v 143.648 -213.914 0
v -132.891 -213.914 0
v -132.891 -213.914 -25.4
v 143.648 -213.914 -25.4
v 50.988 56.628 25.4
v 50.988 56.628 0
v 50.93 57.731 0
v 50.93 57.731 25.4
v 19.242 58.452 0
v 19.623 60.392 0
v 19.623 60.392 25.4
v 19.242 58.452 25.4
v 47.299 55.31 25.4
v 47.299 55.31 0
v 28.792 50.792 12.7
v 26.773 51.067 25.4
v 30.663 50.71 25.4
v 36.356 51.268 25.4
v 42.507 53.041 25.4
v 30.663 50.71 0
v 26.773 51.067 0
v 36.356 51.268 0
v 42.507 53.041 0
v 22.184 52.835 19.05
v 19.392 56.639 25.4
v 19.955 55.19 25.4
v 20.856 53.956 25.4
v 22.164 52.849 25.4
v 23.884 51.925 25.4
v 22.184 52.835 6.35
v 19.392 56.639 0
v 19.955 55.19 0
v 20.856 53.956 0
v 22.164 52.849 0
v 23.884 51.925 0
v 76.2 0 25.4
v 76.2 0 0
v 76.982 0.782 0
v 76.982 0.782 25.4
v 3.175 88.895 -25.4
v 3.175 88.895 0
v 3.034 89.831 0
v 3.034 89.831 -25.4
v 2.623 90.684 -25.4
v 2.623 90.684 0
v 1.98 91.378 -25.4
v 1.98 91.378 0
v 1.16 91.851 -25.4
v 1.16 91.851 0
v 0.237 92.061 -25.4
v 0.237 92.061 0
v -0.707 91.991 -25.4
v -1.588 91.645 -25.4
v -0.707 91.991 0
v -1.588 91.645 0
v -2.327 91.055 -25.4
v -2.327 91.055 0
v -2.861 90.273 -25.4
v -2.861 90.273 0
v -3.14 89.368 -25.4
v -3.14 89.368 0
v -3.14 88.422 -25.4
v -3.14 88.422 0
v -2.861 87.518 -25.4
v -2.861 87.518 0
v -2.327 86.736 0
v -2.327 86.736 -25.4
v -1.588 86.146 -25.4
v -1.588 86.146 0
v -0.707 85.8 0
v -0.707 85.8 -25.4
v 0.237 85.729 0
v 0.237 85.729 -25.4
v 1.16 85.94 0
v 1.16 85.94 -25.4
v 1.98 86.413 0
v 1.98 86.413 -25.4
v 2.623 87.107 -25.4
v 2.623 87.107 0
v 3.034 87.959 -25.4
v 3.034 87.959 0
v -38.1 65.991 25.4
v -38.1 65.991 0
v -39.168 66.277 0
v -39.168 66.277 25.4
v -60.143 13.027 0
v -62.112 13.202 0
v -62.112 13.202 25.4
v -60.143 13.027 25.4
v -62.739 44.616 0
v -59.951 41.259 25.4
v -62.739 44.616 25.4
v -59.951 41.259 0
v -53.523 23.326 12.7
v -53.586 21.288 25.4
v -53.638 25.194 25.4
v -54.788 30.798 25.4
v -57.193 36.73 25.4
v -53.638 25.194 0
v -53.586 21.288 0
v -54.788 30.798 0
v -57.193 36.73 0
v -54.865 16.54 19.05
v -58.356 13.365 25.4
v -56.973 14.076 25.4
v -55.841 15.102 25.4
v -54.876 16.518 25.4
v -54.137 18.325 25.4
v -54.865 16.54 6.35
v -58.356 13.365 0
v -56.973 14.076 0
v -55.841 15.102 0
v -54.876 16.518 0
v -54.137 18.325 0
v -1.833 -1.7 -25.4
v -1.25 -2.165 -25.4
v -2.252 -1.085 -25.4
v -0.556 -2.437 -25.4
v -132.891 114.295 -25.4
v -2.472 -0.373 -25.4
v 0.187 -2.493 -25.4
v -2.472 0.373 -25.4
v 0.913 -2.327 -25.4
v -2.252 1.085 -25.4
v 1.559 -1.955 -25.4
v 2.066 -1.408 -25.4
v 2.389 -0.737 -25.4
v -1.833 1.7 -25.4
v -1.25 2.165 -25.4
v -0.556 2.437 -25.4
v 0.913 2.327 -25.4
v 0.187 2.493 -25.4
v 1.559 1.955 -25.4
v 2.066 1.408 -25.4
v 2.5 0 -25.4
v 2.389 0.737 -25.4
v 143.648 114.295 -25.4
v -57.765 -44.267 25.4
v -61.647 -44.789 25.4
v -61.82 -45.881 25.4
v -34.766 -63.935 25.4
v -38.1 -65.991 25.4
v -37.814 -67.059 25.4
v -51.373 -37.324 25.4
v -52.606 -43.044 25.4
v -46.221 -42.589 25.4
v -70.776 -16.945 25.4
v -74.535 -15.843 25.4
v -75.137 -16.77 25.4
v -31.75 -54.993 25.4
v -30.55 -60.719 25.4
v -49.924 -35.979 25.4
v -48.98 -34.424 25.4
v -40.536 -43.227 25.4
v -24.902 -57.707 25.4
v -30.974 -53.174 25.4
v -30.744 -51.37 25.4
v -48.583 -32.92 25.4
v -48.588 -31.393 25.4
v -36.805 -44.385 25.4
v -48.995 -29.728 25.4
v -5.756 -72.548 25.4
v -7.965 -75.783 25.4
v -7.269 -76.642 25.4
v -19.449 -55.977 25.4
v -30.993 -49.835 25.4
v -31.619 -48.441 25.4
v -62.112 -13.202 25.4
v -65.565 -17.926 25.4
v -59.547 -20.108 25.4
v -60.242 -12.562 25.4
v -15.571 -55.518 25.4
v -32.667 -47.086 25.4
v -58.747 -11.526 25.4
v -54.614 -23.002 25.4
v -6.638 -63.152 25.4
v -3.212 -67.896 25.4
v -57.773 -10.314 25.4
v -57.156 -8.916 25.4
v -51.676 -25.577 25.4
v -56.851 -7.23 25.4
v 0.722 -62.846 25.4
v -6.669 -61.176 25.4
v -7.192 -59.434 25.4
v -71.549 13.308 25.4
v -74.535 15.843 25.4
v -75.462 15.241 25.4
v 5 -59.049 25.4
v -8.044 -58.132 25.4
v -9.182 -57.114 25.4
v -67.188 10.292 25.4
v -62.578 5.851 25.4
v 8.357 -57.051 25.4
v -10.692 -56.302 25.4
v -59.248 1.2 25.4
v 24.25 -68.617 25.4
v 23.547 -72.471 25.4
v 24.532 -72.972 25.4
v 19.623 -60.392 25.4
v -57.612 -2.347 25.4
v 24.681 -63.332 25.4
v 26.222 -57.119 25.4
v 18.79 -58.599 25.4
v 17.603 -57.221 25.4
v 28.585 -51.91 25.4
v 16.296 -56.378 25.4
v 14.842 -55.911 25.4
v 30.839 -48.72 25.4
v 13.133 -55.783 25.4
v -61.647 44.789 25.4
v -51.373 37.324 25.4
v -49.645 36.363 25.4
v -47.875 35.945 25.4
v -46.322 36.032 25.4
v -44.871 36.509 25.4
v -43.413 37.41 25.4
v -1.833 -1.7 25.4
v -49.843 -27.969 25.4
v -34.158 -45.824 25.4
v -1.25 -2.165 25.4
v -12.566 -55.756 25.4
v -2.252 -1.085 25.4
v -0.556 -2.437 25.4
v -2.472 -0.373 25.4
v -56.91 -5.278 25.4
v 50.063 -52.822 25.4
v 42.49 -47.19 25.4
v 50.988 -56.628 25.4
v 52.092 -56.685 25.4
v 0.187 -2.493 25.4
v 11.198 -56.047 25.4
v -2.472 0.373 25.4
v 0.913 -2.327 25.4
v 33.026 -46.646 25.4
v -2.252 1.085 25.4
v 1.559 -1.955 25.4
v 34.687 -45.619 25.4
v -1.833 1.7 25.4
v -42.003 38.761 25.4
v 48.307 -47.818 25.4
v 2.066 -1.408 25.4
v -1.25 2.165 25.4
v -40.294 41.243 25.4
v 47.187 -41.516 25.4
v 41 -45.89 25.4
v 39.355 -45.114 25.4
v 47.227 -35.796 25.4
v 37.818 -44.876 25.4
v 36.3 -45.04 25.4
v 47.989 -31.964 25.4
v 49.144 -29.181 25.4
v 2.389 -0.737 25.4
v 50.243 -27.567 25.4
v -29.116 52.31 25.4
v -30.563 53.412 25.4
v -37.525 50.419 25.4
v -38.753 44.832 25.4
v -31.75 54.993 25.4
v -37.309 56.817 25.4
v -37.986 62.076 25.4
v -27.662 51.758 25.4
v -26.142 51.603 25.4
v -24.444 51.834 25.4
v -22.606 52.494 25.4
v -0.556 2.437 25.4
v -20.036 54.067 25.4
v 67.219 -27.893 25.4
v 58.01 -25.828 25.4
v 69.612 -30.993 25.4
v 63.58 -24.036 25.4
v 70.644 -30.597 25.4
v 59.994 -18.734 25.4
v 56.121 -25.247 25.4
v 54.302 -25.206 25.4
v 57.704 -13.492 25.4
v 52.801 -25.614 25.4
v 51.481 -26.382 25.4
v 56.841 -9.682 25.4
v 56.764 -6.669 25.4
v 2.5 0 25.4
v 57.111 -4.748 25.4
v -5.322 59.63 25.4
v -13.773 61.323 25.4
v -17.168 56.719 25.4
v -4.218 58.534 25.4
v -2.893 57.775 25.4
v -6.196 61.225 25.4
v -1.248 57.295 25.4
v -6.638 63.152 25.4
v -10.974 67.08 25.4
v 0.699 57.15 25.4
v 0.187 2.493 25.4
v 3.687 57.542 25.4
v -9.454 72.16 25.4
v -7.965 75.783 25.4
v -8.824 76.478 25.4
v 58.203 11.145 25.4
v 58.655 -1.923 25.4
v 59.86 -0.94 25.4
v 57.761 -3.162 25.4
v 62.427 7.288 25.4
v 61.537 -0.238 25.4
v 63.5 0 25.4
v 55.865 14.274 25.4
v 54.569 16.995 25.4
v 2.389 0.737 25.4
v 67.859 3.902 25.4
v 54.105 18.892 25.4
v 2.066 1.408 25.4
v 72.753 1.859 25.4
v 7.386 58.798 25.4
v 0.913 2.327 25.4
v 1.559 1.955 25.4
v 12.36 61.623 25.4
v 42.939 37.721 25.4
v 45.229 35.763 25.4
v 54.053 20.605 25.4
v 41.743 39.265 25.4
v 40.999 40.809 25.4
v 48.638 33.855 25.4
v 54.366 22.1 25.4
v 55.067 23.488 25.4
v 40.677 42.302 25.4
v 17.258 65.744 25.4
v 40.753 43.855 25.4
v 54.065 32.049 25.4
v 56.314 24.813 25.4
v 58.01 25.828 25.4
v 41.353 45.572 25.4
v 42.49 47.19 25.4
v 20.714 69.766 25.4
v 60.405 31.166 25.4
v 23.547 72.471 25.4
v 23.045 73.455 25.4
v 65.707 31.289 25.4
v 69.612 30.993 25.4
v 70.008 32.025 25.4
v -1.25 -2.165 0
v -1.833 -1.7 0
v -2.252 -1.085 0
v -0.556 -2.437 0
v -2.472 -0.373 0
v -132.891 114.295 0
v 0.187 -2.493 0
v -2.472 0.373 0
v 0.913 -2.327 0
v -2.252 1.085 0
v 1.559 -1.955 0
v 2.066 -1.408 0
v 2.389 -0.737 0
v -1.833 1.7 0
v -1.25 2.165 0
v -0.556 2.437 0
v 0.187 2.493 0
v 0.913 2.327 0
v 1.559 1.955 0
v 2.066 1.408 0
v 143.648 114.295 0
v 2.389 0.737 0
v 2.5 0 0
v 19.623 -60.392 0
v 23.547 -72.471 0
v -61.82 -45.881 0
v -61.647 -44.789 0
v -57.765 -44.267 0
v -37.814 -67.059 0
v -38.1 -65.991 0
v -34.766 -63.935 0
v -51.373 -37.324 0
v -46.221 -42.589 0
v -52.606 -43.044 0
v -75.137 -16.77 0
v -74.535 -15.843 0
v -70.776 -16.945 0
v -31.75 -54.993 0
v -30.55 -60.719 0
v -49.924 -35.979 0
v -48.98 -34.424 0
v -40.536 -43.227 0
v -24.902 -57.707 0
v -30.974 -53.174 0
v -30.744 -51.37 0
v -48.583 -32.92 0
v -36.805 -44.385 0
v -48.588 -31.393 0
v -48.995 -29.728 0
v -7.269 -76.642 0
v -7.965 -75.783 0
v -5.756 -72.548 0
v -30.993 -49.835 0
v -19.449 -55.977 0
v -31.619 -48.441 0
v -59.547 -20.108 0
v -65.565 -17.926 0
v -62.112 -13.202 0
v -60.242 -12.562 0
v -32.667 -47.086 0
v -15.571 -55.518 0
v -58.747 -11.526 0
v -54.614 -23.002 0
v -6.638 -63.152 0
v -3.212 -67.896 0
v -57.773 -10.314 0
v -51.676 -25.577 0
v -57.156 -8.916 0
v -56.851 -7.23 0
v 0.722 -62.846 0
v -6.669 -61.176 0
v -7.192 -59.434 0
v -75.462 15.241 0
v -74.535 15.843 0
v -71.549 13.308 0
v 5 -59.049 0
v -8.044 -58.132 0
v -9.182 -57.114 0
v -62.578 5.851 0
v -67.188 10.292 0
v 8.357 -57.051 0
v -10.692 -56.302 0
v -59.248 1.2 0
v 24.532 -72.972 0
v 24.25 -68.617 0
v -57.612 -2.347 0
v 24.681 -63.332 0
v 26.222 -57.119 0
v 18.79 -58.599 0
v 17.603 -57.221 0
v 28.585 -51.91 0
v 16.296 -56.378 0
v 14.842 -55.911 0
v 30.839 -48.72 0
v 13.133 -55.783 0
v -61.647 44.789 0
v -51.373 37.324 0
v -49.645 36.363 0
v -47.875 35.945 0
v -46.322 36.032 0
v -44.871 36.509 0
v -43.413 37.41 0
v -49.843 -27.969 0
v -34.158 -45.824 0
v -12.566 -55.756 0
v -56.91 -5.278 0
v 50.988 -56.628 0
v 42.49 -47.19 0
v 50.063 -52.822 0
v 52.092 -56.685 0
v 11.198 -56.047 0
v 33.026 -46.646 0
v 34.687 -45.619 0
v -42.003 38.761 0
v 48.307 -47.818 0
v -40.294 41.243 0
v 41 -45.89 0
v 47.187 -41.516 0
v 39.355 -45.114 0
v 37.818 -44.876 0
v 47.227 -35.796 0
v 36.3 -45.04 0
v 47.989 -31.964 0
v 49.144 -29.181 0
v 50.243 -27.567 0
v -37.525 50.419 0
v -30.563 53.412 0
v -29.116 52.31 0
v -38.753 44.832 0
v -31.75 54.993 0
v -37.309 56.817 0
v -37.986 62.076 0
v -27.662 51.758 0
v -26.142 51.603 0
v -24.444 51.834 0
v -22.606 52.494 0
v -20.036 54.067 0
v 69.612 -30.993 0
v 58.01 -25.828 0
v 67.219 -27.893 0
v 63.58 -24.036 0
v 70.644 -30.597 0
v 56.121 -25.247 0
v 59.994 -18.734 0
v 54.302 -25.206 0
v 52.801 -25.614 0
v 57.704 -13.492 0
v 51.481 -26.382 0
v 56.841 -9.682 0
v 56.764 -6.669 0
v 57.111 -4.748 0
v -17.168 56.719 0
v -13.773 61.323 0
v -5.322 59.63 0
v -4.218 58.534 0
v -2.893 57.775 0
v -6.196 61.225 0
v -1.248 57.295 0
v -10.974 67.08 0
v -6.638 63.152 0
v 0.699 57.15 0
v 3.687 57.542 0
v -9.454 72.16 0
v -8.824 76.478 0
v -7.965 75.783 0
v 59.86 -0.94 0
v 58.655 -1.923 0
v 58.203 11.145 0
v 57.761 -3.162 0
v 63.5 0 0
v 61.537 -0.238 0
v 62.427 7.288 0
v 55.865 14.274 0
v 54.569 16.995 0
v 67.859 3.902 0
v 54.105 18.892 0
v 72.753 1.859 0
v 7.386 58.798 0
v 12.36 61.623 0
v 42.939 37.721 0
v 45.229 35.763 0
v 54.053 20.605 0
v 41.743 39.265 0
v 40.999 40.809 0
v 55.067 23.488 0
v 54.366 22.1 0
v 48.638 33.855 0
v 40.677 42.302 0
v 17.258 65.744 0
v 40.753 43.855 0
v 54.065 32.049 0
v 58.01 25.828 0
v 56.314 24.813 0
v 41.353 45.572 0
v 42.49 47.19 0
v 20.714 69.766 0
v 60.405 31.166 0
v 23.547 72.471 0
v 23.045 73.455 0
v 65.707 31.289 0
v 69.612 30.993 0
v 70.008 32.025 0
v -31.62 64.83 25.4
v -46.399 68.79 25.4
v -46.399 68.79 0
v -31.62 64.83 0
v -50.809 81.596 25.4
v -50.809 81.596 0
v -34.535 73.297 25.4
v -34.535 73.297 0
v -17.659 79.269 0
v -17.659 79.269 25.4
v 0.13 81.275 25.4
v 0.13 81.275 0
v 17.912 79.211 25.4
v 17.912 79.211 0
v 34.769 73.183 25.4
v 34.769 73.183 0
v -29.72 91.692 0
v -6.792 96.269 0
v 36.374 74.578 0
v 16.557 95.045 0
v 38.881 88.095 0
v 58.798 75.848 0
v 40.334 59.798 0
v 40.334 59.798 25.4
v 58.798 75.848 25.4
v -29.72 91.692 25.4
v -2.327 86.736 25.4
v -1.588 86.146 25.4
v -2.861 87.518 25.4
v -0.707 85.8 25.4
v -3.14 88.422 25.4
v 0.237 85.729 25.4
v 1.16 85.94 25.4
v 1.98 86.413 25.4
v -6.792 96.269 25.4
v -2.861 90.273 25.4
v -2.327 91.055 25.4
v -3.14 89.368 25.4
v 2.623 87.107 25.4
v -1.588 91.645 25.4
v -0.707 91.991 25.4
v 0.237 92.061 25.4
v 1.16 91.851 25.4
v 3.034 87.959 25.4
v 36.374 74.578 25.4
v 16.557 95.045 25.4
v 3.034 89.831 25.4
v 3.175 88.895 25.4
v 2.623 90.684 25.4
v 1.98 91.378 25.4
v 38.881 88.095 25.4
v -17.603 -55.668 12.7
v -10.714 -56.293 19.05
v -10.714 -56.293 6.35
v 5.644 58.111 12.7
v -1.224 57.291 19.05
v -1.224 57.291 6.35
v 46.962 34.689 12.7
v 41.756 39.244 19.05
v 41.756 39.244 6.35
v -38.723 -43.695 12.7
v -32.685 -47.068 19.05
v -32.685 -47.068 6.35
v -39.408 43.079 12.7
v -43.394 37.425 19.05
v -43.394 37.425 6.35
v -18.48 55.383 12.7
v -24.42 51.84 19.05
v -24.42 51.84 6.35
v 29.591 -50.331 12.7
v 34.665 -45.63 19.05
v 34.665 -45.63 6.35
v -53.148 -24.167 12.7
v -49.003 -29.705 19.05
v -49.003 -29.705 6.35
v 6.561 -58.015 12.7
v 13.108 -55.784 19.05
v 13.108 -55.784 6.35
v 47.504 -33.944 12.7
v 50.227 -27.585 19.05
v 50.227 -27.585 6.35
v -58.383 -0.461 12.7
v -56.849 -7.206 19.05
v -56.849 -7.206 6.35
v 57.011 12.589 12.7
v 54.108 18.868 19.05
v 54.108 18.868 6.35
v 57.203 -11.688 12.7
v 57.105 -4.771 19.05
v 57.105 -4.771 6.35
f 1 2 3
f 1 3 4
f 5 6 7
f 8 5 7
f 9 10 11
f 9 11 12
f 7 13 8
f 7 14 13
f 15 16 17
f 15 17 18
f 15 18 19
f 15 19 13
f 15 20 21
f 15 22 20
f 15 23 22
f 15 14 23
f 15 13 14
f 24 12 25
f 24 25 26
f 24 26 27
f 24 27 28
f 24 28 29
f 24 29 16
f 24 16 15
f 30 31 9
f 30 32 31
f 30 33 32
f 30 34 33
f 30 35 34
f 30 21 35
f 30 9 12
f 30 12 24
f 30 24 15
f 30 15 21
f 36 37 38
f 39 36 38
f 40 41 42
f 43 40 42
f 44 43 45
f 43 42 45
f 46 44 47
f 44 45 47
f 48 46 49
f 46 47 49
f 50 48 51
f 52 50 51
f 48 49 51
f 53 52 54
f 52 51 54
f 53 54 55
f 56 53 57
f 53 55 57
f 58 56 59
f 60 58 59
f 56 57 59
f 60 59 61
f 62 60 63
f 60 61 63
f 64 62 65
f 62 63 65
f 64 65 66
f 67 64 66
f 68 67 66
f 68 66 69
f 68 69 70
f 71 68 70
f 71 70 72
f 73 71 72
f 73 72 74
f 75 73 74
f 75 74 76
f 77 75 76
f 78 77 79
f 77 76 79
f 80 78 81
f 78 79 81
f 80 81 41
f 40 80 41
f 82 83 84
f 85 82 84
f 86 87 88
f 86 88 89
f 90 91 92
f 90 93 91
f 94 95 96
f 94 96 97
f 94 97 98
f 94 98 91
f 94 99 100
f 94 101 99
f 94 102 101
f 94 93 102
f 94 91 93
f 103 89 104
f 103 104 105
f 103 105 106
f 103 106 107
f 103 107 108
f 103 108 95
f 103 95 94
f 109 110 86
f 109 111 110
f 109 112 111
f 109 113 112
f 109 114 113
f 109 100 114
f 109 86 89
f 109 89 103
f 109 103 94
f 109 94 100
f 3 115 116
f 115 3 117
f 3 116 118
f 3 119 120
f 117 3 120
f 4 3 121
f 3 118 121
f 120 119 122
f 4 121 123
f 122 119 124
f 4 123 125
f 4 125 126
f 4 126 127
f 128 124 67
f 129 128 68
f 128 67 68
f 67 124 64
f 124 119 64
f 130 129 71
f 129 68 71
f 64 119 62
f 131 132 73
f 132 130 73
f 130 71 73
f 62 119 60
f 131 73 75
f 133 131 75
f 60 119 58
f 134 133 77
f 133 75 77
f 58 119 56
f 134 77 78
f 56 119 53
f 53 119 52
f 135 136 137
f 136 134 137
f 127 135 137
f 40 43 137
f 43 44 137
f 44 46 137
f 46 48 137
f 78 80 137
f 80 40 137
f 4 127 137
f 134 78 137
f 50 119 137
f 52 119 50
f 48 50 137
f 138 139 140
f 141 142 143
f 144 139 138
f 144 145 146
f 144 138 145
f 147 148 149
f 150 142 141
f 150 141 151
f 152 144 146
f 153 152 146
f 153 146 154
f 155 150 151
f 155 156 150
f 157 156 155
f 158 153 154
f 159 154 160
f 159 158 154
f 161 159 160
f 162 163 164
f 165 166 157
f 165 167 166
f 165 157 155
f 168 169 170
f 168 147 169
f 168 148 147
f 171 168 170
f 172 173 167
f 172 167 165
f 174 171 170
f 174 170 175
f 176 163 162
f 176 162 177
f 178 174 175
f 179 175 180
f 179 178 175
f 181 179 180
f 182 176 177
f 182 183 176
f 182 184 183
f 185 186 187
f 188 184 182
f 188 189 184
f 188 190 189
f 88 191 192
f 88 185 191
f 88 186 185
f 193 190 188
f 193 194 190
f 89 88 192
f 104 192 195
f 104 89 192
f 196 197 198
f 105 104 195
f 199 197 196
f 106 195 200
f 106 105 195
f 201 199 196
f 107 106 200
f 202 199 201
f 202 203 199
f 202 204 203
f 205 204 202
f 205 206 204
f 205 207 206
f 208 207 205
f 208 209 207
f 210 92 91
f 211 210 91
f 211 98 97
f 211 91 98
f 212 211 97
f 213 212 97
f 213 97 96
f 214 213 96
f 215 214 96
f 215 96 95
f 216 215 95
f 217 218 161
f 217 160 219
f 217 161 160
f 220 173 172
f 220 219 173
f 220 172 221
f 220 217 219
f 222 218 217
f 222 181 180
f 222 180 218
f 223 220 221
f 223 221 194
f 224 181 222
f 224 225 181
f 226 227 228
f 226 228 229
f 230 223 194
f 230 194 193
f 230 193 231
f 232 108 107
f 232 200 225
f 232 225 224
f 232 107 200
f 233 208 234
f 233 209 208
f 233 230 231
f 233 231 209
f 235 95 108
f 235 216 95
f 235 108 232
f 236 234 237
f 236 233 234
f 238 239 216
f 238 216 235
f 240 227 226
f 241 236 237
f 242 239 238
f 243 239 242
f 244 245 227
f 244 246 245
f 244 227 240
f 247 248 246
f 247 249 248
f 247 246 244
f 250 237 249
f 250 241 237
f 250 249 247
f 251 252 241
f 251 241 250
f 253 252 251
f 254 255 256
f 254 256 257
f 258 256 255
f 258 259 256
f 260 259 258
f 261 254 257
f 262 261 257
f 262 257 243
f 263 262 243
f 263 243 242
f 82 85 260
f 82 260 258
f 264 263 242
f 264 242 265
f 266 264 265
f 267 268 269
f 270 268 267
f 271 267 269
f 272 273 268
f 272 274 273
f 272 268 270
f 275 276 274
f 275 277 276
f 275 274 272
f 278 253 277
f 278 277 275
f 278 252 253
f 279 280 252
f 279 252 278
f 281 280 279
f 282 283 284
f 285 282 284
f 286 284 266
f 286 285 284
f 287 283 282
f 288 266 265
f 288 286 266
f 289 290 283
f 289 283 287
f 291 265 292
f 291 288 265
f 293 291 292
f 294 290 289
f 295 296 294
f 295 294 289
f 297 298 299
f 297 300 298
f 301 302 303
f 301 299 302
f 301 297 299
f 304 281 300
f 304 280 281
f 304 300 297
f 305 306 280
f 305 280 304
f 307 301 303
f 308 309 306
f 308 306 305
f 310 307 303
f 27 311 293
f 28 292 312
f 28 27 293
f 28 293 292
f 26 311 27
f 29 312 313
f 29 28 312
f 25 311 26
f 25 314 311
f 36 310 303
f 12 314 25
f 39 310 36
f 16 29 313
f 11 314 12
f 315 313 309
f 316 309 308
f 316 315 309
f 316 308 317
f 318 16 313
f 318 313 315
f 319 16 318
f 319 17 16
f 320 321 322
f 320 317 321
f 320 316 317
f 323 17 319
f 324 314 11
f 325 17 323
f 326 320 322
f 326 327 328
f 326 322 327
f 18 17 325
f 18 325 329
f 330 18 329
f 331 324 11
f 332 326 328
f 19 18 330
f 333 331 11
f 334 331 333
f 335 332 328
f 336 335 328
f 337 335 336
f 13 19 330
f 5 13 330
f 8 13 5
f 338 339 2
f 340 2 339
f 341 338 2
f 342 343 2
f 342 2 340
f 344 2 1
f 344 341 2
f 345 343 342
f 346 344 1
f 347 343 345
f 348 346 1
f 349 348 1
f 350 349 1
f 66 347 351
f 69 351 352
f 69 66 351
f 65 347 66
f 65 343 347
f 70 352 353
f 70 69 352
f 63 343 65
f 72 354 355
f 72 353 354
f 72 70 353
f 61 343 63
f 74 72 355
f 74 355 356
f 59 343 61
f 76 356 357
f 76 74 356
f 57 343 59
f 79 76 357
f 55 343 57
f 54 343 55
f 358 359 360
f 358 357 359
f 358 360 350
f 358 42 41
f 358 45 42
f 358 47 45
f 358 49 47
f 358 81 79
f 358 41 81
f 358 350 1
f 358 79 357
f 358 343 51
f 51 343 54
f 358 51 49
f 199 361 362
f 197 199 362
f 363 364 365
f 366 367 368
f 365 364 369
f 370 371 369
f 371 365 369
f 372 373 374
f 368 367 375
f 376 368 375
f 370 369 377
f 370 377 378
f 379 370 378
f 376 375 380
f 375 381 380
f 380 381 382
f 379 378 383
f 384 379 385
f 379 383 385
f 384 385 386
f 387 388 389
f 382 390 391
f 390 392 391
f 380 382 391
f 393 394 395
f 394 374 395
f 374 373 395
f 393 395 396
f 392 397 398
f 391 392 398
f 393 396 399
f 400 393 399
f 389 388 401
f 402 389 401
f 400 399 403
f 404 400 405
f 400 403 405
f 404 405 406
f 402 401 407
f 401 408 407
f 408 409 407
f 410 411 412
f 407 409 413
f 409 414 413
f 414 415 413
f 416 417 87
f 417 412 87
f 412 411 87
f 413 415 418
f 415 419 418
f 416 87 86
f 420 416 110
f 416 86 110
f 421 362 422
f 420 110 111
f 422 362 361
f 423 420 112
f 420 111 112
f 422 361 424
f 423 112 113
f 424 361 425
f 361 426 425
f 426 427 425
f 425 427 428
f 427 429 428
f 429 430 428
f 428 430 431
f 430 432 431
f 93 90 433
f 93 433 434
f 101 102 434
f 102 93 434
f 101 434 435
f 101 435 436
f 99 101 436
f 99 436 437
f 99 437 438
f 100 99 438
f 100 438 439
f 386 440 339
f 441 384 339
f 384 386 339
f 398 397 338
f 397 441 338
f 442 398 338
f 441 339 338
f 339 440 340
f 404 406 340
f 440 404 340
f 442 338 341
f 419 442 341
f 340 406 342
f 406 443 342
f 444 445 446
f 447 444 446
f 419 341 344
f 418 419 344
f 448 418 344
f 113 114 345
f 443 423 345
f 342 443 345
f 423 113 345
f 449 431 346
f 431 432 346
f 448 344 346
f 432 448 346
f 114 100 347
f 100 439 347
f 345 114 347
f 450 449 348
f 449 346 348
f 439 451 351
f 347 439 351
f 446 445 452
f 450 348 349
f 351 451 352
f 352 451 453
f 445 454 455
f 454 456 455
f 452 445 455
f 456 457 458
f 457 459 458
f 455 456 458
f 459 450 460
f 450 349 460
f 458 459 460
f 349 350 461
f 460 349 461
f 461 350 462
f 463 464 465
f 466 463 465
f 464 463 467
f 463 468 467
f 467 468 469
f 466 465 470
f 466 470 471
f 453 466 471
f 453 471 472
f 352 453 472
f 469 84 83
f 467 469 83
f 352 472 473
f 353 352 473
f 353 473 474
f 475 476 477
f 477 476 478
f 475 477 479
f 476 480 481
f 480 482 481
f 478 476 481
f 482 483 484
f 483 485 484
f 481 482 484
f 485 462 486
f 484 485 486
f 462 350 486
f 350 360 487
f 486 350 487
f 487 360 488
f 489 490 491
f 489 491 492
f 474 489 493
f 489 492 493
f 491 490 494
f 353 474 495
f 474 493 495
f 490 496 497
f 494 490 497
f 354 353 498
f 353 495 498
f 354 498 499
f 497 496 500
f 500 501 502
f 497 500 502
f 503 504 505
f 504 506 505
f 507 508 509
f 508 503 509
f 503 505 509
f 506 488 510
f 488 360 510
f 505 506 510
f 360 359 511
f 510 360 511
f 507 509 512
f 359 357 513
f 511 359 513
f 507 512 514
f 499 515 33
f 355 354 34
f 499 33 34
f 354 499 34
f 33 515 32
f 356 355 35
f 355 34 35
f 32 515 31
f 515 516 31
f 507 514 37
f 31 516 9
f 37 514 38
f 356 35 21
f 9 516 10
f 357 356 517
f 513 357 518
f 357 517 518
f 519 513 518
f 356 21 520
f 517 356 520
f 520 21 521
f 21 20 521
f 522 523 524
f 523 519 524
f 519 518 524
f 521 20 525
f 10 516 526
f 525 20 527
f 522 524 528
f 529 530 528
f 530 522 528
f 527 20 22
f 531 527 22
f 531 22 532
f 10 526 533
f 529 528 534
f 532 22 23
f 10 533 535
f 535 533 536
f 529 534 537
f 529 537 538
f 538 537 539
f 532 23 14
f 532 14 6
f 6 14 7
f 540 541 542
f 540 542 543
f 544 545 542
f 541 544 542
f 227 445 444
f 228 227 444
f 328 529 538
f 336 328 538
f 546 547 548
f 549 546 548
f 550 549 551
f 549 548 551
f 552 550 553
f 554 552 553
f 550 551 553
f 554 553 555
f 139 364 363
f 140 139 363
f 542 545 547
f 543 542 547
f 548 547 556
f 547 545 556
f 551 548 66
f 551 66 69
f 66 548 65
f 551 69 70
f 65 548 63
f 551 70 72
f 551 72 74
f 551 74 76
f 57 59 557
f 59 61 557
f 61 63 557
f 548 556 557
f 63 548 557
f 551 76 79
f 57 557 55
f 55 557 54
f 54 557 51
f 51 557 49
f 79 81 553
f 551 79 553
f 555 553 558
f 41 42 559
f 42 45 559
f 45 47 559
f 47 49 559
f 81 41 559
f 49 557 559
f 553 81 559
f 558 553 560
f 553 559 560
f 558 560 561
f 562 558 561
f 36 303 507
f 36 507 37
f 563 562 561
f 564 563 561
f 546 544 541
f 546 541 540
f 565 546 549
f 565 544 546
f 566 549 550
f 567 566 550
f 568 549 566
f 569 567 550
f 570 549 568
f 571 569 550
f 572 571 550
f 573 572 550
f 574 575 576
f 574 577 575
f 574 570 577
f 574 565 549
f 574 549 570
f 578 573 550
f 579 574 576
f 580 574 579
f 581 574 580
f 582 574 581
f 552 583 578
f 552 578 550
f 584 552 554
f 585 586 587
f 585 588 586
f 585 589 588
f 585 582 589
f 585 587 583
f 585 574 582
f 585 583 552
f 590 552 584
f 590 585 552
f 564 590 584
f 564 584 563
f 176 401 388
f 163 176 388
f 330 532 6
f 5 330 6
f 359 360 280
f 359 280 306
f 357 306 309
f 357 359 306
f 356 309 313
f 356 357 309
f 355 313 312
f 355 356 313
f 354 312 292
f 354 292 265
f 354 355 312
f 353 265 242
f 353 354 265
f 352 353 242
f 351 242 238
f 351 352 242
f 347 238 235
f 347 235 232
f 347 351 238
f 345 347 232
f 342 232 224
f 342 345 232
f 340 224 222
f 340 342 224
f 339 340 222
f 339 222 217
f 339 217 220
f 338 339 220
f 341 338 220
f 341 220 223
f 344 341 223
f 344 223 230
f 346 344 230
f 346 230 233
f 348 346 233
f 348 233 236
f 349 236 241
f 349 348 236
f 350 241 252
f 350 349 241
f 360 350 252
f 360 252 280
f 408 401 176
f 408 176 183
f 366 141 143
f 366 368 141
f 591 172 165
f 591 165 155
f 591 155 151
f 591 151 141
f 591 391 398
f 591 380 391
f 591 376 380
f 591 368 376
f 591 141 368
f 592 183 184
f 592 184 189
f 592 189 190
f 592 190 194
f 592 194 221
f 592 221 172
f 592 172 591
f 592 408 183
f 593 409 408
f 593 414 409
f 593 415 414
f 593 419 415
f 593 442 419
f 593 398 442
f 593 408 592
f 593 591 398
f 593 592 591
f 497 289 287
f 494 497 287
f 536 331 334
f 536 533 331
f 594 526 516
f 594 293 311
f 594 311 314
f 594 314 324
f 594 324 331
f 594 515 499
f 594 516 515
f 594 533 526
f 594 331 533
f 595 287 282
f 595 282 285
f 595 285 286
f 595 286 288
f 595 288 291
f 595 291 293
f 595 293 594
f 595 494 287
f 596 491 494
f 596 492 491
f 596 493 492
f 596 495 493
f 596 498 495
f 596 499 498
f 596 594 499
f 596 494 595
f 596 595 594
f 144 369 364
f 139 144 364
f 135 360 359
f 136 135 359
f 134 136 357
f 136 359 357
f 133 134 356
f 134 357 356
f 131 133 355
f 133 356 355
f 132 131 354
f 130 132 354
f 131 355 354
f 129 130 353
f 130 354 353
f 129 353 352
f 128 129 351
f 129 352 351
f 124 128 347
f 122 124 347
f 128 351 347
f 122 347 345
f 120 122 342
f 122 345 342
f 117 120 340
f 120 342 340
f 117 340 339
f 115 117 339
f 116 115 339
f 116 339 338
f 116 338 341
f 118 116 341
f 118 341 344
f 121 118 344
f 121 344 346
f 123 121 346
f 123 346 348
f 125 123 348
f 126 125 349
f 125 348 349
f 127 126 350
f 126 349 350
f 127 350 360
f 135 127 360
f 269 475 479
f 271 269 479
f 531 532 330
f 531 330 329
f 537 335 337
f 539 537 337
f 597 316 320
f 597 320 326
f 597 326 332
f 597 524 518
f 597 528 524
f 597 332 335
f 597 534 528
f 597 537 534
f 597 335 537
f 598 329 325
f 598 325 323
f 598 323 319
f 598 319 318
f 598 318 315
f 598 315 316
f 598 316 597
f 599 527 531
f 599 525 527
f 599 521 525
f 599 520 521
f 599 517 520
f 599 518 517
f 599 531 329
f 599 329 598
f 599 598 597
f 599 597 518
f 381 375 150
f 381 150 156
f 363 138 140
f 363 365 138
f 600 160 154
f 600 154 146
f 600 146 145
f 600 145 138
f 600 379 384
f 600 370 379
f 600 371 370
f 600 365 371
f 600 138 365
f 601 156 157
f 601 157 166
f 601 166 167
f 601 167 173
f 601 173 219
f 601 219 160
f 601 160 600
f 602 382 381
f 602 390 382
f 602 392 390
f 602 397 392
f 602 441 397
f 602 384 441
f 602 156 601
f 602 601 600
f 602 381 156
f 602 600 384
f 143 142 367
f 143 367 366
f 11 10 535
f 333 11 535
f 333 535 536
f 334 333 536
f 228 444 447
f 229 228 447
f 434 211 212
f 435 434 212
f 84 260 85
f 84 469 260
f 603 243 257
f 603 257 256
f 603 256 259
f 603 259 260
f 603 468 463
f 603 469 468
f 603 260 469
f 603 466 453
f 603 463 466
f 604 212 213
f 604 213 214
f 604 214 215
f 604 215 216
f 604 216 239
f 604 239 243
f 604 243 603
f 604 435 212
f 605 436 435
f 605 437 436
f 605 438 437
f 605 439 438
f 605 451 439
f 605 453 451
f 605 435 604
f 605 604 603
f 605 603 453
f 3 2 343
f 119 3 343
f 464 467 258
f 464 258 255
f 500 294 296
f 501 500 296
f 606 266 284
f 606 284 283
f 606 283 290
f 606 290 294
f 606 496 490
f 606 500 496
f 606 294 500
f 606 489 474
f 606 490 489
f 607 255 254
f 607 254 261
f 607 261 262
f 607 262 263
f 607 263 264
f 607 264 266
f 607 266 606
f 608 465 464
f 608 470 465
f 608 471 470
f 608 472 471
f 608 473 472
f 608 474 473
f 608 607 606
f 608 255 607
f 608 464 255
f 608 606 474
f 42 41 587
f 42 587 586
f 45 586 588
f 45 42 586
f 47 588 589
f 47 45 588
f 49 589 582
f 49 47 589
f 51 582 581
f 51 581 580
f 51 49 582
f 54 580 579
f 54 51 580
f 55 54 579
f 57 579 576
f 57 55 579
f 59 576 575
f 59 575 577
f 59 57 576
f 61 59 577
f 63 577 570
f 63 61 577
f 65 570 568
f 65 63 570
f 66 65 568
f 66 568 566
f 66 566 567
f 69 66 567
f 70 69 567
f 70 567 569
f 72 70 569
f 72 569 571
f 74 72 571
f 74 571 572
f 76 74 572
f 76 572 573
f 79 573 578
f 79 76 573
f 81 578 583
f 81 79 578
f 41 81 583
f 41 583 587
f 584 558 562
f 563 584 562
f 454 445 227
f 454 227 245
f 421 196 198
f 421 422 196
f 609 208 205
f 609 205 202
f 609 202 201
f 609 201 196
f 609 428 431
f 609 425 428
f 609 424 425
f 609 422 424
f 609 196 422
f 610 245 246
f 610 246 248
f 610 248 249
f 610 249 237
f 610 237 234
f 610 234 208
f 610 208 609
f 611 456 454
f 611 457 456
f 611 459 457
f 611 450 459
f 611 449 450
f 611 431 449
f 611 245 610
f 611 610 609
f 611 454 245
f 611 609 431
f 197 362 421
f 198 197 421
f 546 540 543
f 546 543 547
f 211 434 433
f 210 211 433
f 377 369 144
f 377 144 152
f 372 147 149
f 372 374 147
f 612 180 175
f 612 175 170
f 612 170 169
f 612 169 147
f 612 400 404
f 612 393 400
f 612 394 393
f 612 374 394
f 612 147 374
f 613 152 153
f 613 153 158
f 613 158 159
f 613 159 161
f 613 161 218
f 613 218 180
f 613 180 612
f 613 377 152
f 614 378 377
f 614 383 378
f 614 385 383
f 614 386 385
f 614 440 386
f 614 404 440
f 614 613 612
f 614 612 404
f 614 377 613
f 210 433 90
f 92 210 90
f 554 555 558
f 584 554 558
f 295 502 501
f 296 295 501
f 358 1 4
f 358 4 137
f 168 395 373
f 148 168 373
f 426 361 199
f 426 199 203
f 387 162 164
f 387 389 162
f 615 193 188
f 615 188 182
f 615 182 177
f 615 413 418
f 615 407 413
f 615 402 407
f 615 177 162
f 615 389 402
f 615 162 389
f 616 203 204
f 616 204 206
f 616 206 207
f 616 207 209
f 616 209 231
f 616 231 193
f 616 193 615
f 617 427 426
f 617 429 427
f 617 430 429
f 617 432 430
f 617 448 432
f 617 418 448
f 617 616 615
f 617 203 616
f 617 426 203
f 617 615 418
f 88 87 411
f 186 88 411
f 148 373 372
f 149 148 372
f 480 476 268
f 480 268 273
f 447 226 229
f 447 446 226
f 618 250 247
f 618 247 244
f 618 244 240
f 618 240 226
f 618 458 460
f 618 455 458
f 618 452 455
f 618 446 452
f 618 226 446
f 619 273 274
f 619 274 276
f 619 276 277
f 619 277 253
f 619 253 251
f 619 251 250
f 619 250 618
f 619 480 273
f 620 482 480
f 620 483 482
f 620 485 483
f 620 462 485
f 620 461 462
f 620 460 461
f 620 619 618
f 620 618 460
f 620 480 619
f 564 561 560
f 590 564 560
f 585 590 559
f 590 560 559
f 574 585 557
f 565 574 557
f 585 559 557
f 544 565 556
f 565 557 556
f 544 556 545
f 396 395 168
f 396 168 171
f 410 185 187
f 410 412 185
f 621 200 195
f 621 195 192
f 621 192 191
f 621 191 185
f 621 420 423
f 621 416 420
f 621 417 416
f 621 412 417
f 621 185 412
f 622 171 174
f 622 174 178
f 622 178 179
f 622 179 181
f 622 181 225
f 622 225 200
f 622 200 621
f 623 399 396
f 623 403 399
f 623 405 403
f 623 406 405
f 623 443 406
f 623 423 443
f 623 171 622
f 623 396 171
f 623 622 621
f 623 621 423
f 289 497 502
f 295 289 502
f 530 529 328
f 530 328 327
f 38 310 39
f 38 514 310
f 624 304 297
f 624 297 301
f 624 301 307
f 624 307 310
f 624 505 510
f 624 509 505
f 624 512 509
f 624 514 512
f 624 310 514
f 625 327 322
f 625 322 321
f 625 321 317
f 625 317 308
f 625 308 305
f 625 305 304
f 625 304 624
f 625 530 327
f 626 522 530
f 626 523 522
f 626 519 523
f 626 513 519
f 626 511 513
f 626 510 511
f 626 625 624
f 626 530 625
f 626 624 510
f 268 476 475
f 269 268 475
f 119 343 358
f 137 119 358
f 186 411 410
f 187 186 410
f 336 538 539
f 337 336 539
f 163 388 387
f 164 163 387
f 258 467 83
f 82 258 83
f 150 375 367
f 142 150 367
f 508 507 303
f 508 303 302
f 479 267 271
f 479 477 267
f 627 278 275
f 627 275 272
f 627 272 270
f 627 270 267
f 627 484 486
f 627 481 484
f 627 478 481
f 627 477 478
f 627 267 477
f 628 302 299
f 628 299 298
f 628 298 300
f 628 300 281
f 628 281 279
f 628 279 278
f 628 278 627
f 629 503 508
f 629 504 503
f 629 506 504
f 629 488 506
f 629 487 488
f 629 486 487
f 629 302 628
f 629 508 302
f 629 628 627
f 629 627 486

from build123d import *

# Parameters (mm, degrees)
F0_R     = 2.5
F1_DEPTH = 25.4
F2_R     = 3.175
F3_DEPTH = 25.4
F4_W     = 276.5388935804
F4_H     = 328.2092958689
F4_R     = 2.5
F4_R_2   = 3.175
F5_DEPTH = 25.4


with BuildPart() as f1:
    # F0 (on Top) → F1 (new body)
    with BuildSketch(Plane.XY):
        with BuildLine():
            Line((-31.75, 54.9926131403), (-38.1, 65.9911357684))
            Line((-38.1, 65.9911357684), (-39.1676334379, 66.2772072859))
            add(Edge.make_bspline(
                [(-51.3725791428, 37.3243635206), (-20.4343957802, 14.8464575684), (-39.1676334379, 66.2772072859)],
                knots=[5.8868413258, 5.8868413258, 5.8868413258, 8.4002814063, 8.4002814063, 8.4002814063], degree=2, weights=[1, 0.3089380758, 1]))
            Line((-51.3725791428, 37.3243635206), (-61.6470949714, 44.7892362247))
            Line((-61.6470949714, 44.7892362247), (-62.7387824177, 44.6163299195))
            add(Edge.make_bspline(
                [(-62.1123726466, 13.2023923669), (-24.7063477576, 5.2514963308), (-62.7387824177, 44.6163299195)],
                knots=[5.8868413258, 5.8868413258, 5.8868413258, 8.4002814063, 8.4002814063, 8.4002814063], degree=2, weights=[1, 0.3089380758, 1]))
            Line((-62.1123726466, 13.2023923669), (-74.5348471759, 15.8428708403))
            Line((-74.5348471759, 15.8428708403), (-75.4618259535, 15.2408837834))
            add(Edge.make_bspline(
                [(-62.1123726466, -13.2023923669), (-24.7063477576, -5.2514963308), (-75.4618259535, 15.2408837834)],
                knots=[5.8868413258, 5.8868413258, 5.8868413258, 8.4002814063, 8.4002814063, 8.4002814063], degree=2, weights=[1, 0.3089380758, 1]))
            Line((-62.1123726466, -13.2023923669), (-74.5348471759, -15.8428708403))
            Line((-74.5348471759, -15.8428708403), (-75.1368342328, -16.7698496179))
            add(Edge.make_bspline(
                [(-51.3725791428, -37.3243635206), (-20.4343957802, -14.8464575684), (-75.1368342328, -16.7698496179)],
                knots=[5.8868413258, 5.8868413258, 5.8868413258, 8.4002814063, 8.4002814063, 8.4002814063], degree=2, weights=[1, 0.3089380758, 1]))
            Line((-51.3725791428, -37.3243635206), (-61.6470949714, -44.7892362247))
            Line((-61.6470949714, -44.7892362247), (-61.8200012766, -45.880923671))
            add(Edge.make_bspline(
                [(-31.75, -54.9926131403), (-12.6291511317, -21.8743314166), (-61.8200012766, -45.880923671)],
                knots=[5.8868413258, 5.8868413258, 5.8868413258, 8.4002814063, 8.4002814063, 8.4002814063], degree=2, weights=[1, 0.3089380758, 1]))
            Line((-31.75, -54.9926131403), (-38.1, -65.9911357684))
            Line((-38.1, -65.9911357684), (-37.8139284825, -67.0587692063))
            add(Edge.make_bspline(
                [(-6.6375574175, -63.1521403559), (-2.6402115203, -25.1199346408), (-37.8139284825, -67.0587692063)],
                knots=[5.8868413258, 5.8868413258, 5.8868413258, 8.4002814063, 8.4002814063, 8.4002814063], degree=2, weights=[1, 0.3089380758, 1]))
            Line((-6.6375574175, -63.1521403559), (-7.965068901, -75.7825684271))
            Line((-7.965068901, -75.7825684271), (-7.269483925, -76.641544336))
            add(Edge.make_bspline(
                [(19.6225791428, -60.3920887847), (7.8052446485, -24.0220729582), (-7.269483925, -76.641544336)],
                knots=[5.8868413258, 5.8868413258, 5.8868413258, 8.4002814063, 8.4002814063, 8.4002814063], degree=2, weights=[1, 0.3089380758, 1]))
            Line((19.6225791428, -60.3920887847), (23.5470949714, -72.4705065417))
            Line((23.5470949714, -72.4705065417), (24.5319204442, -72.9723001834))
            add(Edge.make_bspline(
                [(42.4897935038, -47.1896964178), (16.9011031091, -18.7705766274), (24.5319204442, -72.9723001834)],
                knots=[5.8868413258, 5.8868413258, 5.8868413258, 8.4002814063, 8.4002814063, 8.4002814063], degree=2, weights=[1, 0.3089380758, 1]))
            Line((42.4897935038, -47.1896964178), (50.9877522045, -56.6276357014))
            Line((50.9877522045, -56.6276357014), (52.0915329032, -56.6854823966))
            add(Edge.make_bspline(
                [(58.0101365603, -25.8277768353), (23.0746073005, -10.2734770724), (52.0915329032, -56.6854823966)],
                knots=[5.8868413258, 5.8868413258, 5.8868413258, 8.4002814063, 8.4002814063, 8.4002814063], degree=2, weights=[1, 0.3089380758, 1]))
            Line((58.0101365603, -25.8277768353), (69.6121638724, -30.9933322024))
            Line((69.6121638724, -30.9933322024), (70.6440460865, -30.597229732))
            add(Edge.make_bspline(
                [(63.5, 0), (25.2583022634, 0), (70.6440460865, -30.597229732)],
                knots=[5.8868413258, 5.8868413258, 5.8868413258, 8.4002814063, 8.4002814063, 8.4002814063], degree=2, weights=[1, 0.3089380758, 1]))
            Line((63.5, 0), (76.2, 0))
            Line((76.2, 0), (76.9815619204, 0.7815619204))
            add(Edge.make_bspline(
                [(58.0101365603, 25.8277768353), (23.0746073005, 10.2734770724), (76.9815619204, 0.7815619204)],
                knots=[5.8868413258, 5.8868413258, 5.8868413258, 8.4002814063, 8.4002814063, 8.4002814063], degree=2, weights=[1, 0.3089380758, 1]))
            Line((58.0101365603, 25.8277768353), (69.6121638724, 30.9933322024))
            Line((69.6121638724, 30.9933322024), (70.0082663428, 32.0252144165))
            add(Edge.make_bspline(
                [(42.4897935038, 47.1896964178), (16.9011031091, 18.7705766274), (70.0082663428, 32.0252144165)],
                knots=[5.8868413258, 5.8868413258, 5.8868413258, 8.4002814063, 8.4002814063, 8.4002814063], degree=2, weights=[1, 0.3089380758, 1]))
            Line((42.4897935038, 47.1896964178), (50.9877522045, 56.6276357014))
            Line((50.9877522045, 56.6276357014), (50.9299055093, 57.7314164))
            add(Edge.make_bspline(
                [(19.6225791428, 60.3920887847), (7.8052446485, 24.0220729582), (50.9299055093, 57.7314164)],
                knots=[5.8868413258, 5.8868413258, 5.8868413258, 8.4002814063, 8.4002814063, 8.4002814063], degree=2, weights=[1, 0.3089380758, 1]))
            Line((19.6225791428, 60.3920887847), (23.5470949714, 72.4705065417))
            Line((23.5470949714, 72.4705065417), (23.0453013296, 73.4553320146))
            add(Edge.make_bspline(
                [(-6.6375574175, 63.1521403559), (-2.6402115203, 25.1199346408), (23.0453013296, 73.4553320146)],
                knots=[5.8868413258, 5.8868413258, 5.8868413258, 8.4002814063, 8.4002814063, 8.4002814063], degree=2, weights=[1, 0.3089380758, 1]))
            Line((-6.6375574175, 63.1521403559), (-7.965068901, 75.7825684271))
            Line((-7.965068901, 75.7825684271), (-8.8240448099, 76.478153403))
            add(Edge.make_bspline(
                [(-31.75, 54.9926131403), (-12.6291511317, 21.8743314166), (-8.8240448099, 76.478153403)],
                knots=[5.8868413258, 5.8868413258, 5.8868413258, 8.4002814063, 8.4002814063, 8.4002814063], degree=2, weights=[1, 0.3089380758, 1]))
        make_face()
        Circle(F0_R, mode=Mode.SUBTRACT)
    extrude(amount=F1_DEPTH)


with BuildPart() as f3:
    # F2 (on Top) → F3 (new body)
    with BuildSketch(Plane.XY):
        with BuildLine():
            Line((-50.8088127398, 81.5957321908), (-46.3994504025, 68.7900141272))
            Line((-46.3994504025, 68.7900141272), (-31.6195875436, 64.8297618099))
            Line((-31.6195875436, 64.8297618099), (-34.5351147482, 73.2970676315))
            ThreePointArc((-34.5351147482, 73.2970676315), (0.1301029976, 81.2751245868), (34.7687654101, 73.1825489513))
            Line((34.7687654101, 73.1825489513), (36.3741745596, 74.5781098338))
            Line((36.3741745596, 74.5781098338), (40.3344268768, 59.7982469749))
            Line((40.3344268768, 59.7982469749), (58.7980814107, 75.8484569928))
            ThreePointArc((58.7980814107, 75.8484569928), (4.9208633921, 96.3863070542), (-50.8088127398, 81.5957321908))
        make_face()
        with Locations((0, 88.8952320787)):
            Circle(F2_R, mode=Mode.SUBTRACT)
    extrude(amount=F3_DEPTH)


with BuildPart() as f5:
    # F4 (on Top) → F5 (new body)
    with BuildSketch(Plane.XY):
        with Locations((5.3789392114, -49.8094158558)):
            Rectangle(F4_W, F4_H)
        Circle(F4_R, mode=Mode.SUBTRACT)
        with Locations((0, 88.8952320787)):
            Circle(F4_R_2, mode=Mode.SUBTRACT)
    extrude(amount=-F5_DEPTH)


solid = Compound([f1.part, f3.part, f5.part])
